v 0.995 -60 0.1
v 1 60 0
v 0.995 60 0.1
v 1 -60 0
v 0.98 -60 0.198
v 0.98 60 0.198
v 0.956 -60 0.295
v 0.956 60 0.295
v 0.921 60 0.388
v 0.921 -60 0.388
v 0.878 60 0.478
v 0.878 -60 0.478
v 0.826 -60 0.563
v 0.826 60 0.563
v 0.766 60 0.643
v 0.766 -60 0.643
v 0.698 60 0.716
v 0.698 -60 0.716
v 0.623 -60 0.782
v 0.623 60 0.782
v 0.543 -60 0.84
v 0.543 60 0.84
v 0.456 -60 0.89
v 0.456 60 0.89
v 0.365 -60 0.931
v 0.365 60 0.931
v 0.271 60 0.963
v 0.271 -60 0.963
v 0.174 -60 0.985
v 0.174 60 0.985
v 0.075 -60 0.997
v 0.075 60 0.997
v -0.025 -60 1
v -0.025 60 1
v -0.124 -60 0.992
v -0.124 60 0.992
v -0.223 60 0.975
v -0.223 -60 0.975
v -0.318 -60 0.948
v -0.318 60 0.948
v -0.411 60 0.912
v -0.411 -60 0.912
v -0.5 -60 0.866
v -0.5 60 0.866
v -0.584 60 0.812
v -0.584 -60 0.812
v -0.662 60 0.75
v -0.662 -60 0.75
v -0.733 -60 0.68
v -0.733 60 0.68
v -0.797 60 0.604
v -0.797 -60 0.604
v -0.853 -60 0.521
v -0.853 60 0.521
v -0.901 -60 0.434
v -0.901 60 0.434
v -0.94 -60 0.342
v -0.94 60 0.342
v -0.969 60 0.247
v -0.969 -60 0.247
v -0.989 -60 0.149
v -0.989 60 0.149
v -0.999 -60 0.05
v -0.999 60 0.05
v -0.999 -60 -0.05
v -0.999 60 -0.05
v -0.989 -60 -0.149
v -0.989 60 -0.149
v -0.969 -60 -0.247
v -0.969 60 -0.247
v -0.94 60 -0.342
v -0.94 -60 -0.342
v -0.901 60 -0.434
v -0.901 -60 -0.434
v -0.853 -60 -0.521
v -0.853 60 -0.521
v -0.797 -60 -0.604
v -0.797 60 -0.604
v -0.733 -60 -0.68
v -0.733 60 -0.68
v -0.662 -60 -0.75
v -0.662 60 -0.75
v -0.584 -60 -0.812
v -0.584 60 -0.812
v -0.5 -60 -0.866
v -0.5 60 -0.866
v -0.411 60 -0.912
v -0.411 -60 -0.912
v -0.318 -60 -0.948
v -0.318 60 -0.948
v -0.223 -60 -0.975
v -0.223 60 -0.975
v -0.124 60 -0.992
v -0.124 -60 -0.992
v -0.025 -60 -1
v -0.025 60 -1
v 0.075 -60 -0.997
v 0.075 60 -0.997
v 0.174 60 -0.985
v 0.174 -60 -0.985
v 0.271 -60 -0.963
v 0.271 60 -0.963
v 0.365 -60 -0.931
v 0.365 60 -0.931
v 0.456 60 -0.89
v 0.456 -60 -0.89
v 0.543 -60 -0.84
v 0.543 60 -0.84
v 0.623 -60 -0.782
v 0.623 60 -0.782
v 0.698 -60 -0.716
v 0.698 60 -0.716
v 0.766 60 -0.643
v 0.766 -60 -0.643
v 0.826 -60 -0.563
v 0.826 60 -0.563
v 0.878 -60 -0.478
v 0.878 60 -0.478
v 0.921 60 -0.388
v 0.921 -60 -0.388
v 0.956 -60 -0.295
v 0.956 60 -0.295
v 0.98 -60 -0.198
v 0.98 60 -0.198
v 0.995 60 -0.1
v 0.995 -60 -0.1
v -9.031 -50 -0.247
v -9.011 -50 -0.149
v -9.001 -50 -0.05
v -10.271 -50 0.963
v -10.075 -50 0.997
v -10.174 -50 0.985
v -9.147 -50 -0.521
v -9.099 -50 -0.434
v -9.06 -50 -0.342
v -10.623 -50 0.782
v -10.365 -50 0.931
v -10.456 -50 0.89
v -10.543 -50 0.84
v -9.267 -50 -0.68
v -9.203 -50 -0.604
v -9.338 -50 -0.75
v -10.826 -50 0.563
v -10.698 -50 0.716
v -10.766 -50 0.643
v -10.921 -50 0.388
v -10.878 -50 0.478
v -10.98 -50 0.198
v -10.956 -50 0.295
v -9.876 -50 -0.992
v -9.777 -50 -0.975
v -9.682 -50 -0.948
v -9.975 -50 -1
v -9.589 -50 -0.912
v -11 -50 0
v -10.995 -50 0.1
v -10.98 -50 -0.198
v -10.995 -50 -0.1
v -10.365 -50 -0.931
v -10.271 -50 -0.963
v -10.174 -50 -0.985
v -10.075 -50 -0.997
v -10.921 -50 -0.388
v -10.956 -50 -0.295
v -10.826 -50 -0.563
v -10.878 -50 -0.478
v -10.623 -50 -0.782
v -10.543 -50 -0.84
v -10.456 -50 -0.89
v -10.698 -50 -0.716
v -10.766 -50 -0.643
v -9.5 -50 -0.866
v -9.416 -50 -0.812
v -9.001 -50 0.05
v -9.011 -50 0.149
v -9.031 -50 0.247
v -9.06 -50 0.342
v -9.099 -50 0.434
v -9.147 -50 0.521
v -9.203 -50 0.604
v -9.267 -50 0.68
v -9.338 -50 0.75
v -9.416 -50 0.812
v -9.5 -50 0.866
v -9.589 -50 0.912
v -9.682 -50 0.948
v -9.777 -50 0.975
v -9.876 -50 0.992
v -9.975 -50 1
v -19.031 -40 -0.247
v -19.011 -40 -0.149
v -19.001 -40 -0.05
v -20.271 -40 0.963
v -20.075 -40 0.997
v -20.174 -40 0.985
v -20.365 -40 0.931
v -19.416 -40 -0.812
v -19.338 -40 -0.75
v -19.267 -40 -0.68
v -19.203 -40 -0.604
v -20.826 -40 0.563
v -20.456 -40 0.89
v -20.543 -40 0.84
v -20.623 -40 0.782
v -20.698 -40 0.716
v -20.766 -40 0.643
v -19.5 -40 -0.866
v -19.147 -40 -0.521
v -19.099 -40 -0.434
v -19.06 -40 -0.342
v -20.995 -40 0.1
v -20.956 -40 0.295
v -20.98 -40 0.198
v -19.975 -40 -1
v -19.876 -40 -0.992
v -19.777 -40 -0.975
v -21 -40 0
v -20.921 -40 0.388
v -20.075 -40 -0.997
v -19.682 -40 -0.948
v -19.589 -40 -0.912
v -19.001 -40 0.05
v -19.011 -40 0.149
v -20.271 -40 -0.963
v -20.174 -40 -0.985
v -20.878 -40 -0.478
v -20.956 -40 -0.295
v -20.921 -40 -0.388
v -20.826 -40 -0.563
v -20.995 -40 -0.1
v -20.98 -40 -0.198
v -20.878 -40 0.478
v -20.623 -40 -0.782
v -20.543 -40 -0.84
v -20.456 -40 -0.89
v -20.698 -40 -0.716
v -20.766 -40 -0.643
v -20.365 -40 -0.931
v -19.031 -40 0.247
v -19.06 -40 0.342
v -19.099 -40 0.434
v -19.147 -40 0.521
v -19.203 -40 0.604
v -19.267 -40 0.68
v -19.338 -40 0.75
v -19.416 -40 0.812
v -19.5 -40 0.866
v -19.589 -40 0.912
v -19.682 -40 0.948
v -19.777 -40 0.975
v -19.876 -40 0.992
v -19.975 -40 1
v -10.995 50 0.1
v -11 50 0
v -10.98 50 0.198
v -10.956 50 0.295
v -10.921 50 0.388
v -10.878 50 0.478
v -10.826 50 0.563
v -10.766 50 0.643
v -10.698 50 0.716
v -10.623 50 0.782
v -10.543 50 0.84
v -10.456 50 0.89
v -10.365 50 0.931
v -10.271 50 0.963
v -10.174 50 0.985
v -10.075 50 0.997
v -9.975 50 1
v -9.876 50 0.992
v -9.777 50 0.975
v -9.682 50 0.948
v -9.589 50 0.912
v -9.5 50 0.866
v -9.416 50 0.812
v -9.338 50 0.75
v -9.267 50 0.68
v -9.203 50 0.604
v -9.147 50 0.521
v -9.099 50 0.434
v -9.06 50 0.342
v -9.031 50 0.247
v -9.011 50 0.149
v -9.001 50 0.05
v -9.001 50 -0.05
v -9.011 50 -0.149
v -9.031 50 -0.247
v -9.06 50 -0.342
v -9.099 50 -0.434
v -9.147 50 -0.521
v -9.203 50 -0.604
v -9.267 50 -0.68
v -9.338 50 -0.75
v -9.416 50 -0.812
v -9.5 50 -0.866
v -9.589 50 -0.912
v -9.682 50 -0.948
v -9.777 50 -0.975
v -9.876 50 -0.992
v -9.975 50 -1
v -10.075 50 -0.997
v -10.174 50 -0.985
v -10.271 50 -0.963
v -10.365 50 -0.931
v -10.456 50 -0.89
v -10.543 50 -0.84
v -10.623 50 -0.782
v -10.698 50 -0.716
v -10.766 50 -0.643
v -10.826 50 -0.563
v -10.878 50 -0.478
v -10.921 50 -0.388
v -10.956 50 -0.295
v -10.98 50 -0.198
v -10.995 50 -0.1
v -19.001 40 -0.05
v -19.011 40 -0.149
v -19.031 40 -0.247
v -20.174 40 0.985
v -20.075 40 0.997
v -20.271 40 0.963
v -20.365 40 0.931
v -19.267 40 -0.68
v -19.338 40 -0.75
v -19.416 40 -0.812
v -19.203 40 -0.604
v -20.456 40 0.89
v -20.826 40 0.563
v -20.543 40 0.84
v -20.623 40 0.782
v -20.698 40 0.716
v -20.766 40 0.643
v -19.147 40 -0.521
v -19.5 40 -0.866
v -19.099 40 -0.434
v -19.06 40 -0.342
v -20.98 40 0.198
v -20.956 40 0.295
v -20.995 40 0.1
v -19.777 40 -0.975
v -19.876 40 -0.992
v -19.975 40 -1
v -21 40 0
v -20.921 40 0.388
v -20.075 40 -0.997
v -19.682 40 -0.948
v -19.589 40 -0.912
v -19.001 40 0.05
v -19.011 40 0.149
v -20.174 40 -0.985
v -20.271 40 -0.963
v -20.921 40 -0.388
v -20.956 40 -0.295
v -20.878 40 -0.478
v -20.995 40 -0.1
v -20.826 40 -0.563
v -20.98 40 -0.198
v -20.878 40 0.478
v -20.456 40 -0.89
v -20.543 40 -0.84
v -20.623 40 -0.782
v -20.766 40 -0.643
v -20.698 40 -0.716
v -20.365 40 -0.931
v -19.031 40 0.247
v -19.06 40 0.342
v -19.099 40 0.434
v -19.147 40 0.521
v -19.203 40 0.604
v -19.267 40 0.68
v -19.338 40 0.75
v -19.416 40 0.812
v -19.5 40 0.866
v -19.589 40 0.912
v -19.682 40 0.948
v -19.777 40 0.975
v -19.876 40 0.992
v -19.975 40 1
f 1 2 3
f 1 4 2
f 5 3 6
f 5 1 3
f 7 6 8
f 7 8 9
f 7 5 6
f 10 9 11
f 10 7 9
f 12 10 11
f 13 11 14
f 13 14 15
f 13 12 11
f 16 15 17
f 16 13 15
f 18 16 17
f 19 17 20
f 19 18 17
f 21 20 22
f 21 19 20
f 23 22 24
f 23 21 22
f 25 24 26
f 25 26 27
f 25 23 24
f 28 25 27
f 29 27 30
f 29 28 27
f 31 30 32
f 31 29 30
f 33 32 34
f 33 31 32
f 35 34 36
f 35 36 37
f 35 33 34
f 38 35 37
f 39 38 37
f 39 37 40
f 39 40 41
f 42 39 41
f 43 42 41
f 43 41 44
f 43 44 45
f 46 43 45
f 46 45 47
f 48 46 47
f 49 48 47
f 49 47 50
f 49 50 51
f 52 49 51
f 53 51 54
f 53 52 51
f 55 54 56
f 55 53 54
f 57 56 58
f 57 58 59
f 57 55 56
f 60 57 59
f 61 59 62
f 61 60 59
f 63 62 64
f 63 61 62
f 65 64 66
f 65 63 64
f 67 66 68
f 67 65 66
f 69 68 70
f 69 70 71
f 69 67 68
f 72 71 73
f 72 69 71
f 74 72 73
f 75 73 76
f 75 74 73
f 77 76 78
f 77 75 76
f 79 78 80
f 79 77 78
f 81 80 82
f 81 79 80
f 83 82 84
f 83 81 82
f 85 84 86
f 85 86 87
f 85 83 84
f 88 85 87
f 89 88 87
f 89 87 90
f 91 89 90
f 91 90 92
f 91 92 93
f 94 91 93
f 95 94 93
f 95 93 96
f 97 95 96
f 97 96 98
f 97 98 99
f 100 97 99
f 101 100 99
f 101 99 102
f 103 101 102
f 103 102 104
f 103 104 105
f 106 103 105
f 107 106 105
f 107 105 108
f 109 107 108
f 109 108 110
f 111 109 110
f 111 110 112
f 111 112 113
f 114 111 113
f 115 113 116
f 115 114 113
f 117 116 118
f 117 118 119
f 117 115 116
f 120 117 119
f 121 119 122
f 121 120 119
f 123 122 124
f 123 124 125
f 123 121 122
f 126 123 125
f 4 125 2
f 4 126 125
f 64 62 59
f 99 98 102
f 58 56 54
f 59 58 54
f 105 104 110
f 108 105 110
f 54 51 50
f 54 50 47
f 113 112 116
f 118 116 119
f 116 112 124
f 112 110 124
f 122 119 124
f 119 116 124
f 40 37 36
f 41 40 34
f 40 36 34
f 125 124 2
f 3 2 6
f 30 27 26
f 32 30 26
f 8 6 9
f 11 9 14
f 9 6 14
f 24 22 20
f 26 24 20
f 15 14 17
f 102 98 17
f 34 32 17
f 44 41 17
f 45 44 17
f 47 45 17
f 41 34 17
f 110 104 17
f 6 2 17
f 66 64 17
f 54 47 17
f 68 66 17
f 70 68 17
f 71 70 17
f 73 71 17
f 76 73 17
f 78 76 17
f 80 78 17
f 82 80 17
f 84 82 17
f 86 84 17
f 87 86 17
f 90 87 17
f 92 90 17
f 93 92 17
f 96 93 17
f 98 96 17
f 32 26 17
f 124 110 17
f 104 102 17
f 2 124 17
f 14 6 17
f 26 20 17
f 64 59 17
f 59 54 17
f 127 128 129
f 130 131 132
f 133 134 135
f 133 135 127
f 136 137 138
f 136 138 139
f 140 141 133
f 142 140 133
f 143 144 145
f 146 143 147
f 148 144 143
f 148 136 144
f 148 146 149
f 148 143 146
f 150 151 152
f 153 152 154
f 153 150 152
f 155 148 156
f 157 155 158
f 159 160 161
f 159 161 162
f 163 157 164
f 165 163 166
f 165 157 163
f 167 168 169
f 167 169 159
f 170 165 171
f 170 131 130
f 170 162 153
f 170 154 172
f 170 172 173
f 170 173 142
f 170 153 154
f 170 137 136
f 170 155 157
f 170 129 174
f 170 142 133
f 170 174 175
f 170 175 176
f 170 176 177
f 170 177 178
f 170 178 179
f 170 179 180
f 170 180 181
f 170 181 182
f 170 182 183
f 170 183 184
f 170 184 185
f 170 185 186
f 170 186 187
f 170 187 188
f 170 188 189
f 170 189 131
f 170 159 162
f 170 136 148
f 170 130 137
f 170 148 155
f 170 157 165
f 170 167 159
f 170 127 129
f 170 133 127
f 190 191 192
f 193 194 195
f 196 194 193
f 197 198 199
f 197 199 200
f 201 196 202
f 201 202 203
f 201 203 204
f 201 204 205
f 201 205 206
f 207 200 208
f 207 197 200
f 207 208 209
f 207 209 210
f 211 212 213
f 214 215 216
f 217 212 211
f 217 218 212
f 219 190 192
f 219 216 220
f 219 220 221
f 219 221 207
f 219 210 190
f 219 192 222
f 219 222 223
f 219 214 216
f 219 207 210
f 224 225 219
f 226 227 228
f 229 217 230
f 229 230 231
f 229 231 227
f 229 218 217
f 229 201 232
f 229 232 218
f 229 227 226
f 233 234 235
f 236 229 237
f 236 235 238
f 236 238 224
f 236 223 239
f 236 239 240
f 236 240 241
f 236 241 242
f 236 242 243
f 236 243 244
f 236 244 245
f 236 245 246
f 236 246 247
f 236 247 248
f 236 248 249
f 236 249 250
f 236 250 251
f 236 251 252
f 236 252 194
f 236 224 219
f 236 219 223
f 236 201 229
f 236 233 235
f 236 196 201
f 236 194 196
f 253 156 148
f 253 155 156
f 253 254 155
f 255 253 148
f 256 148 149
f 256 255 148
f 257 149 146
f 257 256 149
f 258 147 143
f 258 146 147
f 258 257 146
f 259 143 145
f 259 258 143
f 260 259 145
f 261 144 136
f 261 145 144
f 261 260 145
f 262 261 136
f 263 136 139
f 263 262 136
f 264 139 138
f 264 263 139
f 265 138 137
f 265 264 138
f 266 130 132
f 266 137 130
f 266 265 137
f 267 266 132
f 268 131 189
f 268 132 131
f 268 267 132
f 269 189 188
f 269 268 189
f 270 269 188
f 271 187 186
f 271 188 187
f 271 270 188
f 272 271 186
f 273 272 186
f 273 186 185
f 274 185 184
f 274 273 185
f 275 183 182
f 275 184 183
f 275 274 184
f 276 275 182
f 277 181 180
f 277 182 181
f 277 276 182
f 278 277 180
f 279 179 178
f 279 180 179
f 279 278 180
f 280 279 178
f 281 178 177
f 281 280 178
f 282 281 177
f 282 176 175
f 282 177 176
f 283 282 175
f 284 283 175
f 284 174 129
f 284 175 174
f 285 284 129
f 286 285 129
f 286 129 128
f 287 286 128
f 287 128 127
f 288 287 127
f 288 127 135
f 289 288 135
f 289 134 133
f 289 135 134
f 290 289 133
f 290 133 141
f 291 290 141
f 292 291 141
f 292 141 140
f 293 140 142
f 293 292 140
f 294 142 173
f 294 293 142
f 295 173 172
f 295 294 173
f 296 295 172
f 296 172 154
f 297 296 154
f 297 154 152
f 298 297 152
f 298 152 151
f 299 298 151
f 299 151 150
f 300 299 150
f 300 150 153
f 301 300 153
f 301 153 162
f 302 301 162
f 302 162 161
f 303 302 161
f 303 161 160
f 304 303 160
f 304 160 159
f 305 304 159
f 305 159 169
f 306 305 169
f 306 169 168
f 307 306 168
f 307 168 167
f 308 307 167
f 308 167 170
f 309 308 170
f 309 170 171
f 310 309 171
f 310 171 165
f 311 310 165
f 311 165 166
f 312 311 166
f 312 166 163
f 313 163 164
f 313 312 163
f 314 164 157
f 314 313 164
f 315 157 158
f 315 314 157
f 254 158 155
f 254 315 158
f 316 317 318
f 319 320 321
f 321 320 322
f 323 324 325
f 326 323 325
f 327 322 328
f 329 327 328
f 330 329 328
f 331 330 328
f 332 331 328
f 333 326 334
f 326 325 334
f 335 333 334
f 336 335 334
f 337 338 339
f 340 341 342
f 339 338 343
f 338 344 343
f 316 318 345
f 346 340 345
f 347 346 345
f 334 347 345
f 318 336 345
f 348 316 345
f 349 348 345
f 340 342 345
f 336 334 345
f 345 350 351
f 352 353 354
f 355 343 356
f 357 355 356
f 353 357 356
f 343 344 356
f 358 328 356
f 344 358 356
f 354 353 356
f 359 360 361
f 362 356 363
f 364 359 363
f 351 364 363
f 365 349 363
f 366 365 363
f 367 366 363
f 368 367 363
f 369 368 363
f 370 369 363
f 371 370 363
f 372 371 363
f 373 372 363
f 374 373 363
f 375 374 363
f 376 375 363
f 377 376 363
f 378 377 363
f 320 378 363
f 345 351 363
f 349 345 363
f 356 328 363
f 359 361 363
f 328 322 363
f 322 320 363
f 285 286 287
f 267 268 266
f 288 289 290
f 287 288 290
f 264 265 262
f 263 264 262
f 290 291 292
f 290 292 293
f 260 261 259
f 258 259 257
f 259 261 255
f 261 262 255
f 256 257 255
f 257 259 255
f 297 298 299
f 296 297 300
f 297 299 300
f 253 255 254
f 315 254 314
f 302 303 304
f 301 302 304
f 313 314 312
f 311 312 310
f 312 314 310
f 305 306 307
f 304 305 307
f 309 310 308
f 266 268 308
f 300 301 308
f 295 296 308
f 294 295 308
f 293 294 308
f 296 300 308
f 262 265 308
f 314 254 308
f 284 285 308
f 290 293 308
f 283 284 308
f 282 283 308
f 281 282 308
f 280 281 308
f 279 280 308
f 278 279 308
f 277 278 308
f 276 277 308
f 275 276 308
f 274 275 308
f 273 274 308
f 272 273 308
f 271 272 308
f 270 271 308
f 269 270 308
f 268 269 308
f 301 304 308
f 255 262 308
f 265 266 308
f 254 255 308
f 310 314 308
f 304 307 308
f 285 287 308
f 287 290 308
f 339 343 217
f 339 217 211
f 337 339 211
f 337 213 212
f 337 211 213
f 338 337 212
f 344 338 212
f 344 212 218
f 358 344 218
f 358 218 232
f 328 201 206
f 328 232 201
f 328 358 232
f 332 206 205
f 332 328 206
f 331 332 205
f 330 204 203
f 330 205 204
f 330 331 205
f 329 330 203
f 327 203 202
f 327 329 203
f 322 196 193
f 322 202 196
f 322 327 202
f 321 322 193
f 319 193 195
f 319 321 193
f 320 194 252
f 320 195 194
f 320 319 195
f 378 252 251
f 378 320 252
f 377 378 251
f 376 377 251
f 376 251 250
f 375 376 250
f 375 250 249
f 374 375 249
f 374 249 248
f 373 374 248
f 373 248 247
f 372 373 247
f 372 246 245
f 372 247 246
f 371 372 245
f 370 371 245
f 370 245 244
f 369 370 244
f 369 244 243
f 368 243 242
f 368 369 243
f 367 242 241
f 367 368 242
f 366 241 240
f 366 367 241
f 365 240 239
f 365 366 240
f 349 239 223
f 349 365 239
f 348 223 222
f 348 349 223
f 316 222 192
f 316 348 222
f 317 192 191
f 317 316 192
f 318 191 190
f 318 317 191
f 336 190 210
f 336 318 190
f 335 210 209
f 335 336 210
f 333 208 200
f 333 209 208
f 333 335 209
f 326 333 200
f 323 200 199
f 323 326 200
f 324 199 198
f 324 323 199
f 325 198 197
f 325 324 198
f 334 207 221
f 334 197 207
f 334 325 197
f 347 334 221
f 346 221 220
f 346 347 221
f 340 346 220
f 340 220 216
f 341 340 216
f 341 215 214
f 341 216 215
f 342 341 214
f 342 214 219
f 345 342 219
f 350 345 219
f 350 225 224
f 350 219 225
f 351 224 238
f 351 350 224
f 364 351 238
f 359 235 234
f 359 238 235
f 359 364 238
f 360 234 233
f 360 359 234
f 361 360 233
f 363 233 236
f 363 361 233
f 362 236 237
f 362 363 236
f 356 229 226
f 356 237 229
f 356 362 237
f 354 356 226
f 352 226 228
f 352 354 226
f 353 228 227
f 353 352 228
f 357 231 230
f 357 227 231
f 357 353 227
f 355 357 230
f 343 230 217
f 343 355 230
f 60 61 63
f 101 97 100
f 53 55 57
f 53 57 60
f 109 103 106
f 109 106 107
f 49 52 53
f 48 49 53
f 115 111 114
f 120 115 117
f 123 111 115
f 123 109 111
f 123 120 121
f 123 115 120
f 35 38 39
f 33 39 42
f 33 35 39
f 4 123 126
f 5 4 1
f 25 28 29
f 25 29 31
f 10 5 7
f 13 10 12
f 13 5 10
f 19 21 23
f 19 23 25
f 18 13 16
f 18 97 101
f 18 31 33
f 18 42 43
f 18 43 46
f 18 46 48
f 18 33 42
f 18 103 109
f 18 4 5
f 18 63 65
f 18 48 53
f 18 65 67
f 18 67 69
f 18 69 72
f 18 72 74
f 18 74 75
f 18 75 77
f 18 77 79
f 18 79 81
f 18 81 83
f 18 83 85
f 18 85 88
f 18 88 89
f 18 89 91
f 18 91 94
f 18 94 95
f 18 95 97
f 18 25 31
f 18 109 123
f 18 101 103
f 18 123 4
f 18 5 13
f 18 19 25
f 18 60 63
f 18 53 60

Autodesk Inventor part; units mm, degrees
ref_plane "YZ Plane" through (0, 0, 0) normal (1, 0, 0) x (0, 1, 0)
ref_plane "XZ Plane" through (0, 0, 0) normal (0, 1, 0) x (-1, 0, 0)
ref_plane "XY Plane" through (0, 0, 0) normal (0, 0, 1) x (1, 0, 0)
sketch "草圖1" plane through (0, 0, 0) normal (0, 0, 1) x (1, 0, 0)
  line L0 (0, 60) -> (1, 60)
  line L1 (1, 60) -> (1, -60)
  line L2 (1, -60) -> (0, -60)
  line L3 (0, -60) -> (0, 60)
  line L4 (0, 49.2923) -> (0, -49.2923)
  line L5 (-11, 50) -> (-10, 50)
  line L6 (-10, 50) -> (-10, -50)
  line L7 (-10, -50) -> (-11, -50)
  line L8 (-11, -50) -> (-11, 50)
  line L9 (-10, 56.3661) -> (-10, -65.7059)
  line L10 (-14.7421, 0) -> (13.3348, 0)
  line L11 (-21, 40) -> (-20, 40)
  line L12 (-20, 40) -> (-20, -40)
  line L13 (-20, -40) -> (-21, -40)
  line L14 (-21, -40) -> (-21, 40)
  point P0 (0, 0)
  point P1 (0, 0)
  point P2 (-11, 0)
  point P3 (-10, 0)
  point P4 (-21, 0)
  dimension "d1" = 120
  dimension "d2" = 2
  dimension "d4" = 10
  dimension "d5" = 2
  dimension "d6" = 100
  dimension "d8" = 80
  dimension "d9" = 20
  dimension "d10" = 2
revolve "迴轉1" add sketch "草圖1" angle 360 about axis through (0, 49.2923, 0) along (0, -1, 0) contours L0 L1 L10 L3 | L1 L2 L3 L10
revolve "迴轉2" add sketch "草圖1" angle 360 about axis through (-10, 56.3661, 0) along (0, -1, 0) separate body contours L6 L7 L8 L10 | L10 L8 L5 L6
revolve "迴轉3" add sketch "草圖1" angle 360 about axis through (-20, 40, 0) along (0, -1, 0) separate body contours L11 L12 L13 L14
properties part number "rod" material "不鏽鋼 AISI 440C、熔接"
